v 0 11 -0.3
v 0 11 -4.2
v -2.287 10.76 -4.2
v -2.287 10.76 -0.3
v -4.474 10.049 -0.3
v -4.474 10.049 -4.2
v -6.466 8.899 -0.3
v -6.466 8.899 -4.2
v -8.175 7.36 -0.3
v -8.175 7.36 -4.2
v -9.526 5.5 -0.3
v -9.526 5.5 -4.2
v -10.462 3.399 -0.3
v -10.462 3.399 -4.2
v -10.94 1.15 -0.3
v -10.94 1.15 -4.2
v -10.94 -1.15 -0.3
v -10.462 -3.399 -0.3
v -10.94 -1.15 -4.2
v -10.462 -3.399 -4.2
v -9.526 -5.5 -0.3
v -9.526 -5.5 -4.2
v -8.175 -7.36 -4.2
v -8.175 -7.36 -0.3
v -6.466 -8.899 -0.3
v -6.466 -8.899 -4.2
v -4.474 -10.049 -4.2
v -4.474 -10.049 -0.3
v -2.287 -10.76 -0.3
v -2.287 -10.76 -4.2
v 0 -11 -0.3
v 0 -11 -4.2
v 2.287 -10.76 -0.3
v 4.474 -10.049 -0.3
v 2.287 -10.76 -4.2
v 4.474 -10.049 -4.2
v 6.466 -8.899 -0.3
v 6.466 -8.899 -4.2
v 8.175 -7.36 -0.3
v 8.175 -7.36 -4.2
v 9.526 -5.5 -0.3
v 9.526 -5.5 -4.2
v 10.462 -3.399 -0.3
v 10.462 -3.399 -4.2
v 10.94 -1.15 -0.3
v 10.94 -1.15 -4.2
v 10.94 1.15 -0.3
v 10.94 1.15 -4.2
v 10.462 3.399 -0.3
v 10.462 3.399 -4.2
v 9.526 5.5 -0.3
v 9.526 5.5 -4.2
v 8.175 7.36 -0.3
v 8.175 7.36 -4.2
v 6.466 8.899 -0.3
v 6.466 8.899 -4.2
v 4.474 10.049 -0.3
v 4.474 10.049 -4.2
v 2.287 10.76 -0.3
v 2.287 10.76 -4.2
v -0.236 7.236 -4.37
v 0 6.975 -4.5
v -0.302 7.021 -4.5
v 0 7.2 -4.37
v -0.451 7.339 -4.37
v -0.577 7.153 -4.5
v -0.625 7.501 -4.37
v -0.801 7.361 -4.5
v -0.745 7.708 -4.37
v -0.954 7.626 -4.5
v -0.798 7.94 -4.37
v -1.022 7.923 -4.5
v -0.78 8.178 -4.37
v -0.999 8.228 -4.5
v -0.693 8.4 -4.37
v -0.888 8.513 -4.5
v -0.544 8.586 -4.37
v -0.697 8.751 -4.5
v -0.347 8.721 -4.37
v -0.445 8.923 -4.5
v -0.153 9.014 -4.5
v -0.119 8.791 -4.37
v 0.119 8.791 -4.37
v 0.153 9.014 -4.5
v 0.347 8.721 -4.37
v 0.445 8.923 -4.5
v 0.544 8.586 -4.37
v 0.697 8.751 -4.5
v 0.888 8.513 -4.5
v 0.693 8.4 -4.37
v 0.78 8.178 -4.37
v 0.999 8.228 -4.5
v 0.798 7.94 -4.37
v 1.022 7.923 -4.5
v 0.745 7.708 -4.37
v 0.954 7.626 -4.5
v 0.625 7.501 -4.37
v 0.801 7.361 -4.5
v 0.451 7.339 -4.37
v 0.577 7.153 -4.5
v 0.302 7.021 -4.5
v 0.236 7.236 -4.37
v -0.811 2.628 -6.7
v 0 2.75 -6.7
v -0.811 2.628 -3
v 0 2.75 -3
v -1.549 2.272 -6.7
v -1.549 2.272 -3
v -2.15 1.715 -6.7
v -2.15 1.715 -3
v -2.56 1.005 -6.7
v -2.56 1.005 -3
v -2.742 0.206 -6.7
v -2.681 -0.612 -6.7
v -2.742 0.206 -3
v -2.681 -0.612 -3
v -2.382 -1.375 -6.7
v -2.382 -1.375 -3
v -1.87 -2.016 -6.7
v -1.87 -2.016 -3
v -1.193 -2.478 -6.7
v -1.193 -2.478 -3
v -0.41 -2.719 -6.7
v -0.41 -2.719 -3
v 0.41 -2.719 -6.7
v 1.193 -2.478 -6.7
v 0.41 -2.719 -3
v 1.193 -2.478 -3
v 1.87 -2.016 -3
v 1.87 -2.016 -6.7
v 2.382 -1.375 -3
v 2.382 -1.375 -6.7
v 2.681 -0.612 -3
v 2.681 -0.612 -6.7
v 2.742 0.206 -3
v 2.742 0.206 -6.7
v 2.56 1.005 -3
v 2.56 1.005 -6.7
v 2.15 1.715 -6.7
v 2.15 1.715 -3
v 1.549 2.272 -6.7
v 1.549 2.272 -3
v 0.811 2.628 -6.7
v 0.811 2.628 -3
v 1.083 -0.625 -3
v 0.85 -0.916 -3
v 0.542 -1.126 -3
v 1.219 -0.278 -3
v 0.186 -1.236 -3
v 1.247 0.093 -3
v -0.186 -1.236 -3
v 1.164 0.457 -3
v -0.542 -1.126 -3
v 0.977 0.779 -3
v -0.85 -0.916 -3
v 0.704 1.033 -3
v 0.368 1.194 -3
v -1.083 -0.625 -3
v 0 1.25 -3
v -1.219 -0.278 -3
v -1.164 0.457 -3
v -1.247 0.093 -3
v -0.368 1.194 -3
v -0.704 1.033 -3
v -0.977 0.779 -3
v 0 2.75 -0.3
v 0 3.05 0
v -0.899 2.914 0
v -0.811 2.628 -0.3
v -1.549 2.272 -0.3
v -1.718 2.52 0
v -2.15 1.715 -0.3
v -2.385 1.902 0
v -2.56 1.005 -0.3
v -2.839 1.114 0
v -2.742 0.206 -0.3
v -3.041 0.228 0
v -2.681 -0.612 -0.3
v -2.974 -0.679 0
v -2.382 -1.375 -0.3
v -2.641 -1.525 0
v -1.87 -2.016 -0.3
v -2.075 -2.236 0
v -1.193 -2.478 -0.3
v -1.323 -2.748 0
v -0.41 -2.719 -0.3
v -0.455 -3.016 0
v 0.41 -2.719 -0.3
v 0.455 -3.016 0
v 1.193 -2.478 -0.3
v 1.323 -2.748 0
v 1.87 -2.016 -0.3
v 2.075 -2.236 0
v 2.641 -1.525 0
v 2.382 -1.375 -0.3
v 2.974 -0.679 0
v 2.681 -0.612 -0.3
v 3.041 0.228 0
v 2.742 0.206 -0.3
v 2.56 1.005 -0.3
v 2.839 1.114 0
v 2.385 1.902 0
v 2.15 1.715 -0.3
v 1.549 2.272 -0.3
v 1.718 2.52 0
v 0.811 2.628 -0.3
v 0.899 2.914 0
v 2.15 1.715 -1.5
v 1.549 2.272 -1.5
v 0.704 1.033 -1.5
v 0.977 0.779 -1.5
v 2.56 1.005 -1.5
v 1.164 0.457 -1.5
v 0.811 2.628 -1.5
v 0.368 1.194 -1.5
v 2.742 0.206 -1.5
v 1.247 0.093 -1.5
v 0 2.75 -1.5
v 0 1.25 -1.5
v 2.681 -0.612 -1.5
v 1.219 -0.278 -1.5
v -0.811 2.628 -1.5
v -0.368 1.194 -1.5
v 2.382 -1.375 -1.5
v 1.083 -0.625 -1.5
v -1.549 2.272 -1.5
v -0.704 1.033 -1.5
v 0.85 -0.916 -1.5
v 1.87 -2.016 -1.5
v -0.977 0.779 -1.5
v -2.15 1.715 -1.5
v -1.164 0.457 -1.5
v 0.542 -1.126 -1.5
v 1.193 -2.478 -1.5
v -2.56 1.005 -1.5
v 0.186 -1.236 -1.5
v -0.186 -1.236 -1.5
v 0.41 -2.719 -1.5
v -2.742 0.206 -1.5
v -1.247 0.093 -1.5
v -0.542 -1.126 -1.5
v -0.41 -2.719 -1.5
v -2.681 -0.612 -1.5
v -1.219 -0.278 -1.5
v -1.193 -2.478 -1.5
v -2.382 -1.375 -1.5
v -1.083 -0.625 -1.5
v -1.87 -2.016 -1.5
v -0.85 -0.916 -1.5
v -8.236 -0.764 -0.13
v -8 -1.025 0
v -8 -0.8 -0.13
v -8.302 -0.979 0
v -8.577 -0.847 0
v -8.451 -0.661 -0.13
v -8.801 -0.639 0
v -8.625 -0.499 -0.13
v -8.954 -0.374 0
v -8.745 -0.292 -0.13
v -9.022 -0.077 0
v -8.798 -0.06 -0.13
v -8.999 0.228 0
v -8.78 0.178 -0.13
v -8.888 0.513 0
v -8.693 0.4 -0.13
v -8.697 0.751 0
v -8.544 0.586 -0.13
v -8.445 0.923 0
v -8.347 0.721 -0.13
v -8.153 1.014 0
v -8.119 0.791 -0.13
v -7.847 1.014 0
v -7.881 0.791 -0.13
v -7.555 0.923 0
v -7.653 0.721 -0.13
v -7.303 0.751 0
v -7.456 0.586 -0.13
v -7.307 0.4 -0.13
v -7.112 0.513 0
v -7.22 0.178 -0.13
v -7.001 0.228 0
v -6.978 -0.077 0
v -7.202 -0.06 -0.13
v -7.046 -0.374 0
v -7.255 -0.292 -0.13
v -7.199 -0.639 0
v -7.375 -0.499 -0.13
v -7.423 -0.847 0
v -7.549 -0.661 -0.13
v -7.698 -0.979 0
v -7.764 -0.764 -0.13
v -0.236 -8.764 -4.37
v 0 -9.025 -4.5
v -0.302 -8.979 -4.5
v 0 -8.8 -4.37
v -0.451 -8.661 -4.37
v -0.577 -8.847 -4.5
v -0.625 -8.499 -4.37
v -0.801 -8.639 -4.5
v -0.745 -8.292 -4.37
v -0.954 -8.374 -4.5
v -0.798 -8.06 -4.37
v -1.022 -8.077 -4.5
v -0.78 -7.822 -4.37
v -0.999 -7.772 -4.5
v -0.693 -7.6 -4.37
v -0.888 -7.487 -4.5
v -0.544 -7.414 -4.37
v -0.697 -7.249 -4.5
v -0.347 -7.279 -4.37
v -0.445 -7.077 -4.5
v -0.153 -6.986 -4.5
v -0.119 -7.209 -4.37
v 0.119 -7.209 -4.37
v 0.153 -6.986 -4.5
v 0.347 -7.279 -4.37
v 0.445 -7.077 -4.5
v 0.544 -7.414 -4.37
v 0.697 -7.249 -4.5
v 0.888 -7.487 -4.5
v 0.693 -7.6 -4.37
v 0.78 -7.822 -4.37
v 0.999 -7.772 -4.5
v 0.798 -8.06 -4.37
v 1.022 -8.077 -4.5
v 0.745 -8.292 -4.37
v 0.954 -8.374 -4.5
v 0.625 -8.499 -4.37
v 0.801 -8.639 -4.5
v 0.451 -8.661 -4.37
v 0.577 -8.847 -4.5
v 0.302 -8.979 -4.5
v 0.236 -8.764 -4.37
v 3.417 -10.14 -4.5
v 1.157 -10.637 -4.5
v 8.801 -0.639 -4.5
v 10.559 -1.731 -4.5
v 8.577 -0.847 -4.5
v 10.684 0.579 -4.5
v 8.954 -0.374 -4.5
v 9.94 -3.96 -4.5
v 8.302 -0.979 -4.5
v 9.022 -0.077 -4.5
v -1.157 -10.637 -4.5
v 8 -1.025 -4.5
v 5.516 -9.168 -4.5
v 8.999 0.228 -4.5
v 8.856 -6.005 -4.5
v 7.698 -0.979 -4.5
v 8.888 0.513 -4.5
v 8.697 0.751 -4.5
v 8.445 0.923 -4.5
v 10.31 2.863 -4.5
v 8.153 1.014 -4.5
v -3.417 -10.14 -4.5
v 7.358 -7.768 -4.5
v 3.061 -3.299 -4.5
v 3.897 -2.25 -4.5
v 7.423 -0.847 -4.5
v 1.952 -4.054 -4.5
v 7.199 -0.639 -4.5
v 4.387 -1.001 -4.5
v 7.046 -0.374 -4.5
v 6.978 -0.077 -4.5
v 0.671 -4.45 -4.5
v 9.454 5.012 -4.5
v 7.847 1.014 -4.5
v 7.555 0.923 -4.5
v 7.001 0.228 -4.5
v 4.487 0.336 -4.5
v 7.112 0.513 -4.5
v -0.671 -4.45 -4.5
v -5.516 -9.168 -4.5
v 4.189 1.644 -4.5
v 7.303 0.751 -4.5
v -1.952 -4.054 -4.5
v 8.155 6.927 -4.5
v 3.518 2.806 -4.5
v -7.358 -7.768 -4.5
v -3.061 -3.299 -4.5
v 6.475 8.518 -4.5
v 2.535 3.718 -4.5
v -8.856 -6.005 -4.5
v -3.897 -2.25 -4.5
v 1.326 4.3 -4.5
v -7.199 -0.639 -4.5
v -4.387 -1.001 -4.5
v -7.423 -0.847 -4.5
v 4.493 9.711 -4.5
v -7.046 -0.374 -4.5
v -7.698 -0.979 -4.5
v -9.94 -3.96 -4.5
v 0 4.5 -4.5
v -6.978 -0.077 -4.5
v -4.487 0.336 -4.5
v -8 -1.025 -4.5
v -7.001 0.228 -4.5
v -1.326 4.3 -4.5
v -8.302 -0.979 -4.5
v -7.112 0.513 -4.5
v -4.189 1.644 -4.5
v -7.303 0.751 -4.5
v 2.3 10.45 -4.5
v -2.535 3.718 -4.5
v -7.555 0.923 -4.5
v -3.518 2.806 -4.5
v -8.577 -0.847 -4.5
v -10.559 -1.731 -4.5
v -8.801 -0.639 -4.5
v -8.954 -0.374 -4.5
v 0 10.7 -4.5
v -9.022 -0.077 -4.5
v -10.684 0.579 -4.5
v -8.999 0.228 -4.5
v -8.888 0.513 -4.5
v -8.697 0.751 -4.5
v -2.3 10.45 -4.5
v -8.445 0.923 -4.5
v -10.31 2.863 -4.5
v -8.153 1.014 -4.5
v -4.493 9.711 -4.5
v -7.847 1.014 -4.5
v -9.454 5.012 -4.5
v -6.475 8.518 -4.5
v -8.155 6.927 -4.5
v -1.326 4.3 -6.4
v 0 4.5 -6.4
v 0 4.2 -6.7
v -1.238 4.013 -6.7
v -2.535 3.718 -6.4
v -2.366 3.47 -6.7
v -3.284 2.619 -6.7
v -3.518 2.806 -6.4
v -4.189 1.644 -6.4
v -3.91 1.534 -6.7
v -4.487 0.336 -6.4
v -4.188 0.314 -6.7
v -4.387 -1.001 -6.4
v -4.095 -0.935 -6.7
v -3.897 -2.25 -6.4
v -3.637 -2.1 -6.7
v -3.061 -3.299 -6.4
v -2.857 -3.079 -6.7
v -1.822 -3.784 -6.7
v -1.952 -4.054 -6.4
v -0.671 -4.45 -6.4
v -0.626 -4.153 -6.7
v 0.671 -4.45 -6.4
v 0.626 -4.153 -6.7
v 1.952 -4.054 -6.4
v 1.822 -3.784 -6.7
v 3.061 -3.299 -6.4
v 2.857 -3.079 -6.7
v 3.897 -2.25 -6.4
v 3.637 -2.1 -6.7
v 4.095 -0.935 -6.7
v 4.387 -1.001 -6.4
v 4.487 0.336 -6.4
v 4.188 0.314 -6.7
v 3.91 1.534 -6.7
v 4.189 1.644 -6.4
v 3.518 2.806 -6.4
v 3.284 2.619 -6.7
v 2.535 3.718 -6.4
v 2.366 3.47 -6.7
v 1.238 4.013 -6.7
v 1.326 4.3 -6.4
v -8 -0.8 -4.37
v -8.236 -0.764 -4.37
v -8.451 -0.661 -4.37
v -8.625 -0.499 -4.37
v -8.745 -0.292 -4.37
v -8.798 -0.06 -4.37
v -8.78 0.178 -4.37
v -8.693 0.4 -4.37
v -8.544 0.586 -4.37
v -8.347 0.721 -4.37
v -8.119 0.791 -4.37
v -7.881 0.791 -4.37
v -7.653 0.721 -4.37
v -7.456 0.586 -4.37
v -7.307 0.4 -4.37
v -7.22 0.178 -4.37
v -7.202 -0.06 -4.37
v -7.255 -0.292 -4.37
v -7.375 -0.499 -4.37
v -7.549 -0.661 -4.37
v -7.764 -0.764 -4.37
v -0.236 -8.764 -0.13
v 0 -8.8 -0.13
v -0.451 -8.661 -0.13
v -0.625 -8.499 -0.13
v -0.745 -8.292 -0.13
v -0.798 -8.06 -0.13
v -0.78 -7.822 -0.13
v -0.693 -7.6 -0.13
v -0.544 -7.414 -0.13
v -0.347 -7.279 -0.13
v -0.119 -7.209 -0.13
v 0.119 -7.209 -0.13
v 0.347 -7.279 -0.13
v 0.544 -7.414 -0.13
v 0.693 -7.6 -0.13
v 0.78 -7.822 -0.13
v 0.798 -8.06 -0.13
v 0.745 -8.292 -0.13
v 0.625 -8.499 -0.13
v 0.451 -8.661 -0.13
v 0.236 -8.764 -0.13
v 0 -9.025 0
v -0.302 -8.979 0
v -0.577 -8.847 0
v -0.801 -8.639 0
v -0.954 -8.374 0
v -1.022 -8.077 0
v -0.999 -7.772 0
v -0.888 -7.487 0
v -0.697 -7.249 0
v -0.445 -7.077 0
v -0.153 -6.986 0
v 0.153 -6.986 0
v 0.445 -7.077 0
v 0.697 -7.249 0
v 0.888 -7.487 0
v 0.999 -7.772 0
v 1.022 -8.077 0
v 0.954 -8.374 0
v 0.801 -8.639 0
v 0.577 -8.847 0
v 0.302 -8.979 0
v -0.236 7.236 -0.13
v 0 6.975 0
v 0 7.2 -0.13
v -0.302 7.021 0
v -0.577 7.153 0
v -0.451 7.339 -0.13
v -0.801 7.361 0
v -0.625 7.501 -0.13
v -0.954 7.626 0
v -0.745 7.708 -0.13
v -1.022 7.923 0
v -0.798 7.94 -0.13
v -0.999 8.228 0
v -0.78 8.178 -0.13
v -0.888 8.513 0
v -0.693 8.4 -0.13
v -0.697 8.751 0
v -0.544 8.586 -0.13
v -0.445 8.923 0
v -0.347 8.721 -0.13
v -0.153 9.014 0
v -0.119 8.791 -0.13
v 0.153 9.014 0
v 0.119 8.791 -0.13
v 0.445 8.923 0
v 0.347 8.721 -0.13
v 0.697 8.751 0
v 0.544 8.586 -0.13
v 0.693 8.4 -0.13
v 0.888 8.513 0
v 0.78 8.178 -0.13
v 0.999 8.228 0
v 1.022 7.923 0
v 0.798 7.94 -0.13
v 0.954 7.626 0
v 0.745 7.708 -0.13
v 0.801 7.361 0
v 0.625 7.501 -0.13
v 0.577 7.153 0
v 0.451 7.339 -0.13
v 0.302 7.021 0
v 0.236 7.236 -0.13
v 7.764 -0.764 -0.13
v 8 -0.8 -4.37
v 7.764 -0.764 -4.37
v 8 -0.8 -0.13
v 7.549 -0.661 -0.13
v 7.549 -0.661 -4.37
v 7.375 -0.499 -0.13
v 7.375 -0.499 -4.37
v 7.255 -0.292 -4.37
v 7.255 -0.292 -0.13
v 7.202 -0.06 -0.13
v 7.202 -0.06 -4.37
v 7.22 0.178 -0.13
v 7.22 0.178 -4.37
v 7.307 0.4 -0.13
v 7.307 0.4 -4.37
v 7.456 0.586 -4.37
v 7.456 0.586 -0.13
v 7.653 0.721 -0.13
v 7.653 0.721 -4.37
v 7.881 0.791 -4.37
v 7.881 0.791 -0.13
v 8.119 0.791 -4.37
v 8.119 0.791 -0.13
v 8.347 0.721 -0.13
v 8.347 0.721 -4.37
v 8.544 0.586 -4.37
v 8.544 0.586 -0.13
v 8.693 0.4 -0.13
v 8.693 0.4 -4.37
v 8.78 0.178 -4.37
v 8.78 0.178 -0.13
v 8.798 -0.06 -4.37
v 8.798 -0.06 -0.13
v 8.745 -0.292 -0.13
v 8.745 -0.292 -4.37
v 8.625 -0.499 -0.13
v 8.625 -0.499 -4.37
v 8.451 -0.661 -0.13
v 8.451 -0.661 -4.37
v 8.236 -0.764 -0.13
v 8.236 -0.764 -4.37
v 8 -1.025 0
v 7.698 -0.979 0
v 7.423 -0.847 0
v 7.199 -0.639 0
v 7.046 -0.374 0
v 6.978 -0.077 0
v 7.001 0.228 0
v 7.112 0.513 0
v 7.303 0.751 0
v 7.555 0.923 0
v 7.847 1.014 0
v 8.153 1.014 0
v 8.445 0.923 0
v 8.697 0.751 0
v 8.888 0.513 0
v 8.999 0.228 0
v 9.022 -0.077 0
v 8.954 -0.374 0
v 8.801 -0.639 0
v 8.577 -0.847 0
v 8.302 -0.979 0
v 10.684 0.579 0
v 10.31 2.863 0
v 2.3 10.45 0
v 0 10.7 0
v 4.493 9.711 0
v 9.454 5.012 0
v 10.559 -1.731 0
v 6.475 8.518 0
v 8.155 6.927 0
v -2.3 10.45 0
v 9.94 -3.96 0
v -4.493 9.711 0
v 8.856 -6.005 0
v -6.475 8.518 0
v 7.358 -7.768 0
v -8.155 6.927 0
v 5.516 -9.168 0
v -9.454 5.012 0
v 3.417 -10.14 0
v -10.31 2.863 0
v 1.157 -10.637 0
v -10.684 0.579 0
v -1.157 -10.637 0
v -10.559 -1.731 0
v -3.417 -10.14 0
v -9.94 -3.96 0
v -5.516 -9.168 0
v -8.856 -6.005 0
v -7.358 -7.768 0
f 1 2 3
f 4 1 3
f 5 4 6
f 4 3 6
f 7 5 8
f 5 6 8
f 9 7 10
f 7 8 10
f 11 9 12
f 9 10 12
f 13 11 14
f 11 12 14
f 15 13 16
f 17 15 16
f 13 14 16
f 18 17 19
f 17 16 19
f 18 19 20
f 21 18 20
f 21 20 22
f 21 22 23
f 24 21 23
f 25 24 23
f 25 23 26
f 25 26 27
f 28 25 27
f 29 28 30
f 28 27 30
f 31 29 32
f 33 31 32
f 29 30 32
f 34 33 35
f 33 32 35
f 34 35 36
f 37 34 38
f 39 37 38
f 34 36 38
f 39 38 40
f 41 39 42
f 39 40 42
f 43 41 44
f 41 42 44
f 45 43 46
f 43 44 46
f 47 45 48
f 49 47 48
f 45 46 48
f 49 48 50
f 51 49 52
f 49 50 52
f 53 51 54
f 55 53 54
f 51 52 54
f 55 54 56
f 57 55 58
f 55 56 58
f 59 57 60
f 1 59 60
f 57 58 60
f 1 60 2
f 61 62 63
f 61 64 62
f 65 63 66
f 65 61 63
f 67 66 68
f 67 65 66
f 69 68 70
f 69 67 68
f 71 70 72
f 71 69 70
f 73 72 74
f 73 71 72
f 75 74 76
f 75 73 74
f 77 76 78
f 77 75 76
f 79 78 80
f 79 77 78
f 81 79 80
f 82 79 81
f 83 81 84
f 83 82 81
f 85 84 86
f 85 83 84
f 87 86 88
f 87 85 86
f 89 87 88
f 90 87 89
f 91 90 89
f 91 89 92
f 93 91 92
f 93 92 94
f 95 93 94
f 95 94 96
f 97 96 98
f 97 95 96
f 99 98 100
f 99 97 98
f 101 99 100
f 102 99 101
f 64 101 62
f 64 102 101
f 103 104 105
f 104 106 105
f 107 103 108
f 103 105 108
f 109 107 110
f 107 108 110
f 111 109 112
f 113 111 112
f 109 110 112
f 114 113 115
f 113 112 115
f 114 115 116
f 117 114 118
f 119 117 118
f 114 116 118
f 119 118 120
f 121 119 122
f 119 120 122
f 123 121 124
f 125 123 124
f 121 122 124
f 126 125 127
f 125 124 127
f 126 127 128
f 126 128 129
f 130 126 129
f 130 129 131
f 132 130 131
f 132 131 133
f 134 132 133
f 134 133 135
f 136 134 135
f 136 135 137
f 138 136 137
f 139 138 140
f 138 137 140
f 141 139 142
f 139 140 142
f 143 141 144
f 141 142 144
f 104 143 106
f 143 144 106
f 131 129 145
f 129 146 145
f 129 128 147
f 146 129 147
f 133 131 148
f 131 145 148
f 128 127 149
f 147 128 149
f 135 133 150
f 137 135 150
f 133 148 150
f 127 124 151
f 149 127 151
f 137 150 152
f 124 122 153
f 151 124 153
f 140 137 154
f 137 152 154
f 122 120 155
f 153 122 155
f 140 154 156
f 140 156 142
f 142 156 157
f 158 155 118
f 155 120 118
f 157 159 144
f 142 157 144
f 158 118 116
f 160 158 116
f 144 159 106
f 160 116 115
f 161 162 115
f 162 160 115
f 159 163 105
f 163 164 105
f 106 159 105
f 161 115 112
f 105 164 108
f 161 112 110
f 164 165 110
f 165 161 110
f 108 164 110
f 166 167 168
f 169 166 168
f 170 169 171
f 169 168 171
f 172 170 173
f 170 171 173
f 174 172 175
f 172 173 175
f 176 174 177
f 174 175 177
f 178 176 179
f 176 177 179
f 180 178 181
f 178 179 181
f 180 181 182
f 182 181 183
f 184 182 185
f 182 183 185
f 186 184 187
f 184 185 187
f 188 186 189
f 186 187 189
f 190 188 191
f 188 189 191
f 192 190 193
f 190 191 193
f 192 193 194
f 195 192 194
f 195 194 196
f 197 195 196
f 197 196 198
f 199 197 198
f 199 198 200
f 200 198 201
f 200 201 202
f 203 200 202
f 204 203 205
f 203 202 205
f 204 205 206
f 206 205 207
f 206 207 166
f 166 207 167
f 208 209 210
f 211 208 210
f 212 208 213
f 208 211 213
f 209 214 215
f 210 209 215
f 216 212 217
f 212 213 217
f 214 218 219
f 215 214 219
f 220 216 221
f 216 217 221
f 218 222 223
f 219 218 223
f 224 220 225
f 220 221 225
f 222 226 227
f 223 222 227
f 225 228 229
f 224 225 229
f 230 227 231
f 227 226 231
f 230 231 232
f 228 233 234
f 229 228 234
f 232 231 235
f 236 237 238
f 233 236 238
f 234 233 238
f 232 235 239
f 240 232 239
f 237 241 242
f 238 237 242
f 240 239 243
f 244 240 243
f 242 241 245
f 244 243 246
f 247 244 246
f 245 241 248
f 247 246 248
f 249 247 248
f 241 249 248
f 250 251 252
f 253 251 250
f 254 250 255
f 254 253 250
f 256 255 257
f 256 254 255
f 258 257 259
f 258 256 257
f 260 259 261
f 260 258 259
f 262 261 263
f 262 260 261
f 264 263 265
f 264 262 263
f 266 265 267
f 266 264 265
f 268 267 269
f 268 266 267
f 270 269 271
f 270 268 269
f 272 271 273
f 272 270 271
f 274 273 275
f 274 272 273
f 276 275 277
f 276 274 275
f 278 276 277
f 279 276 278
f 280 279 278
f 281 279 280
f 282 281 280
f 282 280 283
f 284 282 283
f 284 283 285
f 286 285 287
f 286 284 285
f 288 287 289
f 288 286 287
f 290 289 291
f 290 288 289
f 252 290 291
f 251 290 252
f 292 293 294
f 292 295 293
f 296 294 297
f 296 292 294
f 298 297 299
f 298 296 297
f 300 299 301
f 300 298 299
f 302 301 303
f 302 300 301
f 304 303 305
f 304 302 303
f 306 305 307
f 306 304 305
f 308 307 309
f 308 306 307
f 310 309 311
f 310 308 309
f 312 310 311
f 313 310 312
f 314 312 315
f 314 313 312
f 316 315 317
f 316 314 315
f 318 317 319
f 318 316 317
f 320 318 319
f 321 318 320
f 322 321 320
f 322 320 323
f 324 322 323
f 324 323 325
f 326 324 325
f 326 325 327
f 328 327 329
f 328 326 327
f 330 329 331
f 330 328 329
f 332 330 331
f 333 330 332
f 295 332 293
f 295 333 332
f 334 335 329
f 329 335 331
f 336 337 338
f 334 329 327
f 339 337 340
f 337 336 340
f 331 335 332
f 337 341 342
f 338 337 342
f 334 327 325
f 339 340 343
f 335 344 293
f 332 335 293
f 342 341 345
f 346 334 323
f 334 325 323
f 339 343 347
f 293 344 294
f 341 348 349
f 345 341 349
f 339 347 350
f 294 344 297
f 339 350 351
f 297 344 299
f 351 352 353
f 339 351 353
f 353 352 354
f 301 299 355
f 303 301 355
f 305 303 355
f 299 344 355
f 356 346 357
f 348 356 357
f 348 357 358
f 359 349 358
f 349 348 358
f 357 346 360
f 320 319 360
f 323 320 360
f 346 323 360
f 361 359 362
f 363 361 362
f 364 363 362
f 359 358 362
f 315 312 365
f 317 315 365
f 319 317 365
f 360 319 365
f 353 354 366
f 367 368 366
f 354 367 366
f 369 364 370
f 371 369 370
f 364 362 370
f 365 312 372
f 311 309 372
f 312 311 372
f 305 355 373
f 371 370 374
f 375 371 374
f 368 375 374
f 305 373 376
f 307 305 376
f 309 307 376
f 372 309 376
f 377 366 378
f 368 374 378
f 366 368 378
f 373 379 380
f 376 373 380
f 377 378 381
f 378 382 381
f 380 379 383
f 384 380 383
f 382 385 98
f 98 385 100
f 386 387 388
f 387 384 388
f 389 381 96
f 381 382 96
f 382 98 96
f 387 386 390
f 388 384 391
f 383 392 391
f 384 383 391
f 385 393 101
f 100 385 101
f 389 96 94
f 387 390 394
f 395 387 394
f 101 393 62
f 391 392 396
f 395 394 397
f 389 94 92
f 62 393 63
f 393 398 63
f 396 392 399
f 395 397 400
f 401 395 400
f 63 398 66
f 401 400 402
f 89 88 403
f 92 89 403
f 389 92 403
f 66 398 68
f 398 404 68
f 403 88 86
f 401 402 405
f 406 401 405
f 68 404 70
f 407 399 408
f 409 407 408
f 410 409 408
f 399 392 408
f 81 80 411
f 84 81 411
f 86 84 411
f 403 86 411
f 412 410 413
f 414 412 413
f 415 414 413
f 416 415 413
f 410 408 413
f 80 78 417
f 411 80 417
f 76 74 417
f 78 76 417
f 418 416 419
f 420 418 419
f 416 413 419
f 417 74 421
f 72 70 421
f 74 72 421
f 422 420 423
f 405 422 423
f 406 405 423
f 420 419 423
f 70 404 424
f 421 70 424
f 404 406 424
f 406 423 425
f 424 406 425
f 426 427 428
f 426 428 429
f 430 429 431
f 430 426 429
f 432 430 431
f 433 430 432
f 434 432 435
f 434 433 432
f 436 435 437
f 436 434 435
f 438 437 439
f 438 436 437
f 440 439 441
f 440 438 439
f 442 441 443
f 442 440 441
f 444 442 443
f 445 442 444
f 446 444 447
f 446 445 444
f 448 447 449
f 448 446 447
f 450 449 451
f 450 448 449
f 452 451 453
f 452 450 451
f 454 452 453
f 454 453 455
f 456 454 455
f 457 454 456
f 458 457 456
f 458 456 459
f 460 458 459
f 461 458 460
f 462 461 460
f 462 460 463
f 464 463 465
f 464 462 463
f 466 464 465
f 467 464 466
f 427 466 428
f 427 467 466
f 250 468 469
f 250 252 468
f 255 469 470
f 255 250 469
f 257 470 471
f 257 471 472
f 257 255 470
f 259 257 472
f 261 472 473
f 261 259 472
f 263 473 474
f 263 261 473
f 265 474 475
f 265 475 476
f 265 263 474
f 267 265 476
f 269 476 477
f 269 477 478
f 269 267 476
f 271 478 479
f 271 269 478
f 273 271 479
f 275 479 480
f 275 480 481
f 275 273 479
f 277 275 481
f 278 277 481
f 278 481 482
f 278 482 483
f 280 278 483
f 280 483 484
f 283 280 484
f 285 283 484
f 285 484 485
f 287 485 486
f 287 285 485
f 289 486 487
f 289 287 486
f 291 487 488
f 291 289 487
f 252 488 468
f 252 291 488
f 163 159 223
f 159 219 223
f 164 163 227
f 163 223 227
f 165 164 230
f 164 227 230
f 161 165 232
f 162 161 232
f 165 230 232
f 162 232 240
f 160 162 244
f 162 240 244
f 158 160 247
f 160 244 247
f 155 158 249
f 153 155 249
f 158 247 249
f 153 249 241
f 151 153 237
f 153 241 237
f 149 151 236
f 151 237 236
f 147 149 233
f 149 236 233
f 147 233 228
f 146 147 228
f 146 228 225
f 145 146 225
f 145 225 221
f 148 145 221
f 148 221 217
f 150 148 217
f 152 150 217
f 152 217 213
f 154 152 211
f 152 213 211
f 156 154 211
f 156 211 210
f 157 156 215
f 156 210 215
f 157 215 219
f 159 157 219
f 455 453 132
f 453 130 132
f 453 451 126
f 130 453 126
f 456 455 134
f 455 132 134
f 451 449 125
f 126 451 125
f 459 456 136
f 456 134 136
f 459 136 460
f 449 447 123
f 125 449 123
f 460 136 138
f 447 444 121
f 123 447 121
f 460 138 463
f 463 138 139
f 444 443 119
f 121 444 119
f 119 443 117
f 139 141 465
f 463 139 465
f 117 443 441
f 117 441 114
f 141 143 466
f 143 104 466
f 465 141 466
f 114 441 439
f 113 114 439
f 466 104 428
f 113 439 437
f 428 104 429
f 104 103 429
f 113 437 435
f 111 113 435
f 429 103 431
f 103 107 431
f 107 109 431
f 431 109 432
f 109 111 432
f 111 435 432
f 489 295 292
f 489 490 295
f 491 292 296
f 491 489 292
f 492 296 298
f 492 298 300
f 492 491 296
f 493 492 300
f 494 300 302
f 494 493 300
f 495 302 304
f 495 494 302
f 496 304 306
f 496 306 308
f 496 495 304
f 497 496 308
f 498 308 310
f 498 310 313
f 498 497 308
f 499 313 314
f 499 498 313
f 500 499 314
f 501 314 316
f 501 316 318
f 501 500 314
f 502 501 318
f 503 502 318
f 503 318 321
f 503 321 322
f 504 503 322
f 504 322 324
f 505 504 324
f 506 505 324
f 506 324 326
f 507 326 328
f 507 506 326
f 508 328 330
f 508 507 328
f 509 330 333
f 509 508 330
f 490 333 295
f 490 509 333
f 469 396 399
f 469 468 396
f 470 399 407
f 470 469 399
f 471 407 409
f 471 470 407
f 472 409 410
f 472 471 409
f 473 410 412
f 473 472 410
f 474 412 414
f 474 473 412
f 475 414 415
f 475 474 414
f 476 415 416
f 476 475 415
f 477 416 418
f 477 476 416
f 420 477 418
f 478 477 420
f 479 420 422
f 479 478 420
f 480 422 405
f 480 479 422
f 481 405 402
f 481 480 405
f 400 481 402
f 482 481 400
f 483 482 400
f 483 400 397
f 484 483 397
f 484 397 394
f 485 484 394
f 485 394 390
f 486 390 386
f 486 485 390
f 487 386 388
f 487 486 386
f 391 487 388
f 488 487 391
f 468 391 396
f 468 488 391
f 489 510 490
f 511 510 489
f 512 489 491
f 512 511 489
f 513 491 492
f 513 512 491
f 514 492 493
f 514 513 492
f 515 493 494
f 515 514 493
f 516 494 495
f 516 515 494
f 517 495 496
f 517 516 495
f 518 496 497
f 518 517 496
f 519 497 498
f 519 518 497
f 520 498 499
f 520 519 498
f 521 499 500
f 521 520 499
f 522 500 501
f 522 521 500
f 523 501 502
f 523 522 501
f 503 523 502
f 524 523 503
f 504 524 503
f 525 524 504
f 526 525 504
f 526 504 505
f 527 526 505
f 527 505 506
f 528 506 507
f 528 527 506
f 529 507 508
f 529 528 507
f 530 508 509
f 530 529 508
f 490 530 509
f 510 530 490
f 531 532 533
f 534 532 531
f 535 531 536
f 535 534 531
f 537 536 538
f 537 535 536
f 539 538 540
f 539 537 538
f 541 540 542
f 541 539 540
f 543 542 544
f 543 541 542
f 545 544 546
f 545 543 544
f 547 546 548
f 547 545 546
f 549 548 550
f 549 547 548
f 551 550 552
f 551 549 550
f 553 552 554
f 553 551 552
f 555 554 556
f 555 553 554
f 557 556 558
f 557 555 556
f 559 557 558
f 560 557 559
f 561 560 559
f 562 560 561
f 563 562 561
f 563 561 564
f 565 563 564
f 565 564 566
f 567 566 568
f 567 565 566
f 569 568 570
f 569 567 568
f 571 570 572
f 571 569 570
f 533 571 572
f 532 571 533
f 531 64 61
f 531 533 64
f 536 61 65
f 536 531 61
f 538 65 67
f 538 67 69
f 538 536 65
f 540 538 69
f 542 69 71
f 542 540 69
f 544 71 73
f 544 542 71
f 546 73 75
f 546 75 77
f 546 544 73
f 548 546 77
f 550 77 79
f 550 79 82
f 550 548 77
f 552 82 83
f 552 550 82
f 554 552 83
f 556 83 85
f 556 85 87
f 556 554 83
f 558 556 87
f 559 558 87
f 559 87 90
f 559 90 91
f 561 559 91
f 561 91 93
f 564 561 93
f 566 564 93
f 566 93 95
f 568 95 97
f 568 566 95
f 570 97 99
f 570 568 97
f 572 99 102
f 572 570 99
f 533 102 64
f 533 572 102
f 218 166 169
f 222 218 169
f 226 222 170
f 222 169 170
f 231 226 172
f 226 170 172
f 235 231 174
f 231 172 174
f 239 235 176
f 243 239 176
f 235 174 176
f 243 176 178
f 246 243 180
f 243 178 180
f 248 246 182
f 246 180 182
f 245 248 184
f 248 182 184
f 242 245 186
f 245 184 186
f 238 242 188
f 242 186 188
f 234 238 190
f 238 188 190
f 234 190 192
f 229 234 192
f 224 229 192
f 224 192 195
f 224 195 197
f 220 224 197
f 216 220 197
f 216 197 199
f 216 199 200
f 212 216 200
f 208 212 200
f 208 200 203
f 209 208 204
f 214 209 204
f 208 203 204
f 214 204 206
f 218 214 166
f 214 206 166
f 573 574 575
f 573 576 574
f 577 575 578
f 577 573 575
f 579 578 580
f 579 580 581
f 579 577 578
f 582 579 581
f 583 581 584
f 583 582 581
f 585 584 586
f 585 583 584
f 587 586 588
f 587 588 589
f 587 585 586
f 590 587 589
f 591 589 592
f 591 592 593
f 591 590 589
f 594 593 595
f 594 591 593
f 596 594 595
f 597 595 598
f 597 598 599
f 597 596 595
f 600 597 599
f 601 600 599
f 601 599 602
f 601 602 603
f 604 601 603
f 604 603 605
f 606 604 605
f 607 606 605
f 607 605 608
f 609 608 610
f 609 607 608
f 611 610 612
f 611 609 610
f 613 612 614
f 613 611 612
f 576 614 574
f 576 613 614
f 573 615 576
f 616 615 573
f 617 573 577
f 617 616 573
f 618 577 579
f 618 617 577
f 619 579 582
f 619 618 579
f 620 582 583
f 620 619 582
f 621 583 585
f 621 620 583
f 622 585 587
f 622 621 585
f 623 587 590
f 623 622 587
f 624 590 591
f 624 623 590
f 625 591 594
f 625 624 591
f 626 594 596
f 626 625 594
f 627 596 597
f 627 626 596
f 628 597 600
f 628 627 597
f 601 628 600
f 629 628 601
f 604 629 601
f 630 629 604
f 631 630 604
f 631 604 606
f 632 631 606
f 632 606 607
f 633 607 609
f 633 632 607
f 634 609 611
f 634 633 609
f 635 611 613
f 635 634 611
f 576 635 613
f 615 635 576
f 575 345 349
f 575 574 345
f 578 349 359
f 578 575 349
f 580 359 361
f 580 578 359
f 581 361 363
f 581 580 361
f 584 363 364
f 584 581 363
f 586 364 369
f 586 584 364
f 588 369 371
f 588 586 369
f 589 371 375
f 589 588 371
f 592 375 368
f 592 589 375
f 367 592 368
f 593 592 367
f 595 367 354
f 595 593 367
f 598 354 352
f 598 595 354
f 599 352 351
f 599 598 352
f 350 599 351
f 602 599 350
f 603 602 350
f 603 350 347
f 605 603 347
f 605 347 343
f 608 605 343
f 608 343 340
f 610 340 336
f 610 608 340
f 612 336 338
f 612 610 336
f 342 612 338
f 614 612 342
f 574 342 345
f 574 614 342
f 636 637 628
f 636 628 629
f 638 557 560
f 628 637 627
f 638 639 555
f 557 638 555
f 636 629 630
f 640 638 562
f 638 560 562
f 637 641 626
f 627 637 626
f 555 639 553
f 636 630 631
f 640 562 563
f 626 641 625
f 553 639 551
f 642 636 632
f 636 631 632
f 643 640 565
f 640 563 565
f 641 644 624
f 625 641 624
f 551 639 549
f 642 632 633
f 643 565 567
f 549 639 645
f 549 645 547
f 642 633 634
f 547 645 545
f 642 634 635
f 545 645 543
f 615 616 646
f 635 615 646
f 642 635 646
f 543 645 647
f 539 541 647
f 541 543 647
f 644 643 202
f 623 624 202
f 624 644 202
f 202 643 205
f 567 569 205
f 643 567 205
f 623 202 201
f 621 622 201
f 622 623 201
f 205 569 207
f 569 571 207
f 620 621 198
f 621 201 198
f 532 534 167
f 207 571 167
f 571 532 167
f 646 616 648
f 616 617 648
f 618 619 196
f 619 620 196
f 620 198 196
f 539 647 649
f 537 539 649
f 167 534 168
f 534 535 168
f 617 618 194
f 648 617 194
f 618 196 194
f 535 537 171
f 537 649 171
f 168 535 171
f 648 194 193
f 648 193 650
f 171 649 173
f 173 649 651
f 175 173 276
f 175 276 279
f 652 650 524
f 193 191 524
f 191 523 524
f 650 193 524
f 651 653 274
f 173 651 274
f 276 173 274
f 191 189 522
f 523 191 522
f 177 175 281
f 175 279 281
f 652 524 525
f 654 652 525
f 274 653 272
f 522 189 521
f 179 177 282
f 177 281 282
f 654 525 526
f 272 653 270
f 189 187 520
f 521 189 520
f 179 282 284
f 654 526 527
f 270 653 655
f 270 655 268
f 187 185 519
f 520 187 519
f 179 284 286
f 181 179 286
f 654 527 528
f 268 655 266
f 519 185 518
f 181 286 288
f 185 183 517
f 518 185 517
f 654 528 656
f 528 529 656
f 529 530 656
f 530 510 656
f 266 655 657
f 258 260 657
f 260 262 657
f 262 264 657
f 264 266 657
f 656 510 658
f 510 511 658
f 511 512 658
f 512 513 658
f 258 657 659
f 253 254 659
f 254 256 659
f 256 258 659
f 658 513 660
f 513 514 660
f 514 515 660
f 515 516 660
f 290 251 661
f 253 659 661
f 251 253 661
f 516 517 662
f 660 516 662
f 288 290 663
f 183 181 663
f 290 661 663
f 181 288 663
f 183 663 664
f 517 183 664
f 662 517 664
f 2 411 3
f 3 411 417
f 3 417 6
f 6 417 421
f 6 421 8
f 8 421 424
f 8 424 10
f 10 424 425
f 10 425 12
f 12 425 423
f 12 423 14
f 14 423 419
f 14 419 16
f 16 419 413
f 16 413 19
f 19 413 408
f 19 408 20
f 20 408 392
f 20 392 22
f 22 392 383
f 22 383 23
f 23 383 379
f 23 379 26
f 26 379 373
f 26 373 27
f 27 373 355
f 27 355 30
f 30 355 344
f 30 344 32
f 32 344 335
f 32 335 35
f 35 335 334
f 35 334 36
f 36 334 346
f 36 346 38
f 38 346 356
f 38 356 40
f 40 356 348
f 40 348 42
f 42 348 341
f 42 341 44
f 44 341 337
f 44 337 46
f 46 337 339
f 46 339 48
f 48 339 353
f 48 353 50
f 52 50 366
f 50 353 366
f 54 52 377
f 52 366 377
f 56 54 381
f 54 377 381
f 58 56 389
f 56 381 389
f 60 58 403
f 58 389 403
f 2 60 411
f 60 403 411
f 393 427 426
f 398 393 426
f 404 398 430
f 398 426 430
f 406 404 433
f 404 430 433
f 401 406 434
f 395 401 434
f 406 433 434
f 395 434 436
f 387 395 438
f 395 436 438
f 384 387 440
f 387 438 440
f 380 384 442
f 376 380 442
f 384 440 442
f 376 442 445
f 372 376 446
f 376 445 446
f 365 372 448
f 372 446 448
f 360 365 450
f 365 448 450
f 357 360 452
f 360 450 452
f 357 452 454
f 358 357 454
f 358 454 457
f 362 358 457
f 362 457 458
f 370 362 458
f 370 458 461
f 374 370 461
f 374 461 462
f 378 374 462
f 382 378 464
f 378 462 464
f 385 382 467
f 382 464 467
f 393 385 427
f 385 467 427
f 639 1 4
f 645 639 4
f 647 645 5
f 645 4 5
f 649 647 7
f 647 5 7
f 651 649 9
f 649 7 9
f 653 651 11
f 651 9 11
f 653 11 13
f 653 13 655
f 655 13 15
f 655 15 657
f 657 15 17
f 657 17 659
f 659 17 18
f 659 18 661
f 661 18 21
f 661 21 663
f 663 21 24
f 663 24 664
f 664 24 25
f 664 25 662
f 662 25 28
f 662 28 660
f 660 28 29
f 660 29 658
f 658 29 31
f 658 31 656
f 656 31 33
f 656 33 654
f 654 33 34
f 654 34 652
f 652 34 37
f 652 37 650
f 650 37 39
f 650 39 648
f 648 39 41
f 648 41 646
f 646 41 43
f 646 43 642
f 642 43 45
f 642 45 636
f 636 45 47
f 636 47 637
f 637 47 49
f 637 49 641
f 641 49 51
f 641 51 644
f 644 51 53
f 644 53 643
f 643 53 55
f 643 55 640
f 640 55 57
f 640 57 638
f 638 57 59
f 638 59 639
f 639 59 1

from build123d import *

# Parameters (mm, degrees)
M2_TAPPED_HOLE1_AT_2_COUNT = 2
M2_TAPPED_HOLE1_AT_2_PITCH = 11.313708499
M2_TAPPED_HOLE1_AT_3_COUNT = 2
M2_TAPPED_HOLE1_AT_3_PITCH = 16
M2_TAPPED_HOLE1_AT_4_COUNT = 2
M2_TAPPED_HOLE1_AT_4_PITCH = 11.313708499
M2_TAPPED_HOLE1_AT_5_COUNT = 2
M2_TAPPED_HOLE1_AT_5_PITCH = 8
CHAMFER1_SIZE              = 0.3


with BuildPart() as part:
    # Sketch1 → Revolve1 (revolve)
    with BuildSketch(Plane(origin=(0, 0, 0), x_dir=(0, 0, -1), z_dir=(1, 0, 0))):
        Polygon((3, 1.25), (1.5, 1.25), (1.5, 2.75), (0, 2.75), (0, 11), (4.5, 11), (4.5, 4.5), (6.7, 4.5), (6.7, 2.75), (3, 2.75), align=None)
    revolve(axis=Axis((0, 0, 0), (0, 0, 1)))

    # Sketch4 → M2 Tapped Hole1 (revolve, cut)
    with BuildSketch(Plane(origin=(0, 8, 0), x_dir=(0, -1, 0), z_dir=(1, 0, 0))):
        Polygon((0, 0), (0, 4.5), (1.025, 4.5), (0.8, 4.370096189), (0.8, 0.129903811), (1.025, 0), align=None)
    m2_tapped_hole1 = revolve(axis=Axis((0, 8, 6.35), (0, 0, -1)), mode=Mode.SUBTRACT)

    # M2 Tapped Hole1 at 2: M2 Tapped Hole1 ×2
    with Locations(*[Vector(0.707106781, -0.707106781, 0) * (i * M2_TAPPED_HOLE1_AT_2_PITCH) for i in range(1, M2_TAPPED_HOLE1_AT_2_COUNT)]):
        add(m2_tapped_hole1, mode=Mode.SUBTRACT)

    # M2 Tapped Hole1 at 3: M2 Tapped Hole1 ×2
    with Locations(*[(0, -i * M2_TAPPED_HOLE1_AT_3_PITCH, 0) for i in range(1, M2_TAPPED_HOLE1_AT_3_COUNT)]):
        add(m2_tapped_hole1, mode=Mode.SUBTRACT)

    # M2 Tapped Hole1 at 4: M2 Tapped Hole1 ×2
    with Locations(*[Vector(-0.707106781, -0.707106781, 0) * (i * M2_TAPPED_HOLE1_AT_4_PITCH) for i in range(1, M2_TAPPED_HOLE1_AT_4_COUNT)]):
        add(m2_tapped_hole1, mode=Mode.SUBTRACT)

    # M2 Tapped Hole1 at 5: M2 Tapped Hole1 ×2
    with Locations(*[(0, -i * M2_TAPPED_HOLE1_AT_5_PITCH, 0) for i in range(1, M2_TAPPED_HOLE1_AT_5_COUNT)]):
        add(m2_tapped_hole1, mode=Mode.SUBTRACT)

    # Chamfer1
    chamfer1_edges = [part.edges().sort_by_distance(p)[0] for p in [
        (0, -11, -4.5),
        (0, -11, 0),
        (0, -2.75, 0),
        (0, -4.5, -6.7),
    ]]
    chamfer(chamfer1_edges, length=CHAMFER1_SIZE)


solid = part.part
